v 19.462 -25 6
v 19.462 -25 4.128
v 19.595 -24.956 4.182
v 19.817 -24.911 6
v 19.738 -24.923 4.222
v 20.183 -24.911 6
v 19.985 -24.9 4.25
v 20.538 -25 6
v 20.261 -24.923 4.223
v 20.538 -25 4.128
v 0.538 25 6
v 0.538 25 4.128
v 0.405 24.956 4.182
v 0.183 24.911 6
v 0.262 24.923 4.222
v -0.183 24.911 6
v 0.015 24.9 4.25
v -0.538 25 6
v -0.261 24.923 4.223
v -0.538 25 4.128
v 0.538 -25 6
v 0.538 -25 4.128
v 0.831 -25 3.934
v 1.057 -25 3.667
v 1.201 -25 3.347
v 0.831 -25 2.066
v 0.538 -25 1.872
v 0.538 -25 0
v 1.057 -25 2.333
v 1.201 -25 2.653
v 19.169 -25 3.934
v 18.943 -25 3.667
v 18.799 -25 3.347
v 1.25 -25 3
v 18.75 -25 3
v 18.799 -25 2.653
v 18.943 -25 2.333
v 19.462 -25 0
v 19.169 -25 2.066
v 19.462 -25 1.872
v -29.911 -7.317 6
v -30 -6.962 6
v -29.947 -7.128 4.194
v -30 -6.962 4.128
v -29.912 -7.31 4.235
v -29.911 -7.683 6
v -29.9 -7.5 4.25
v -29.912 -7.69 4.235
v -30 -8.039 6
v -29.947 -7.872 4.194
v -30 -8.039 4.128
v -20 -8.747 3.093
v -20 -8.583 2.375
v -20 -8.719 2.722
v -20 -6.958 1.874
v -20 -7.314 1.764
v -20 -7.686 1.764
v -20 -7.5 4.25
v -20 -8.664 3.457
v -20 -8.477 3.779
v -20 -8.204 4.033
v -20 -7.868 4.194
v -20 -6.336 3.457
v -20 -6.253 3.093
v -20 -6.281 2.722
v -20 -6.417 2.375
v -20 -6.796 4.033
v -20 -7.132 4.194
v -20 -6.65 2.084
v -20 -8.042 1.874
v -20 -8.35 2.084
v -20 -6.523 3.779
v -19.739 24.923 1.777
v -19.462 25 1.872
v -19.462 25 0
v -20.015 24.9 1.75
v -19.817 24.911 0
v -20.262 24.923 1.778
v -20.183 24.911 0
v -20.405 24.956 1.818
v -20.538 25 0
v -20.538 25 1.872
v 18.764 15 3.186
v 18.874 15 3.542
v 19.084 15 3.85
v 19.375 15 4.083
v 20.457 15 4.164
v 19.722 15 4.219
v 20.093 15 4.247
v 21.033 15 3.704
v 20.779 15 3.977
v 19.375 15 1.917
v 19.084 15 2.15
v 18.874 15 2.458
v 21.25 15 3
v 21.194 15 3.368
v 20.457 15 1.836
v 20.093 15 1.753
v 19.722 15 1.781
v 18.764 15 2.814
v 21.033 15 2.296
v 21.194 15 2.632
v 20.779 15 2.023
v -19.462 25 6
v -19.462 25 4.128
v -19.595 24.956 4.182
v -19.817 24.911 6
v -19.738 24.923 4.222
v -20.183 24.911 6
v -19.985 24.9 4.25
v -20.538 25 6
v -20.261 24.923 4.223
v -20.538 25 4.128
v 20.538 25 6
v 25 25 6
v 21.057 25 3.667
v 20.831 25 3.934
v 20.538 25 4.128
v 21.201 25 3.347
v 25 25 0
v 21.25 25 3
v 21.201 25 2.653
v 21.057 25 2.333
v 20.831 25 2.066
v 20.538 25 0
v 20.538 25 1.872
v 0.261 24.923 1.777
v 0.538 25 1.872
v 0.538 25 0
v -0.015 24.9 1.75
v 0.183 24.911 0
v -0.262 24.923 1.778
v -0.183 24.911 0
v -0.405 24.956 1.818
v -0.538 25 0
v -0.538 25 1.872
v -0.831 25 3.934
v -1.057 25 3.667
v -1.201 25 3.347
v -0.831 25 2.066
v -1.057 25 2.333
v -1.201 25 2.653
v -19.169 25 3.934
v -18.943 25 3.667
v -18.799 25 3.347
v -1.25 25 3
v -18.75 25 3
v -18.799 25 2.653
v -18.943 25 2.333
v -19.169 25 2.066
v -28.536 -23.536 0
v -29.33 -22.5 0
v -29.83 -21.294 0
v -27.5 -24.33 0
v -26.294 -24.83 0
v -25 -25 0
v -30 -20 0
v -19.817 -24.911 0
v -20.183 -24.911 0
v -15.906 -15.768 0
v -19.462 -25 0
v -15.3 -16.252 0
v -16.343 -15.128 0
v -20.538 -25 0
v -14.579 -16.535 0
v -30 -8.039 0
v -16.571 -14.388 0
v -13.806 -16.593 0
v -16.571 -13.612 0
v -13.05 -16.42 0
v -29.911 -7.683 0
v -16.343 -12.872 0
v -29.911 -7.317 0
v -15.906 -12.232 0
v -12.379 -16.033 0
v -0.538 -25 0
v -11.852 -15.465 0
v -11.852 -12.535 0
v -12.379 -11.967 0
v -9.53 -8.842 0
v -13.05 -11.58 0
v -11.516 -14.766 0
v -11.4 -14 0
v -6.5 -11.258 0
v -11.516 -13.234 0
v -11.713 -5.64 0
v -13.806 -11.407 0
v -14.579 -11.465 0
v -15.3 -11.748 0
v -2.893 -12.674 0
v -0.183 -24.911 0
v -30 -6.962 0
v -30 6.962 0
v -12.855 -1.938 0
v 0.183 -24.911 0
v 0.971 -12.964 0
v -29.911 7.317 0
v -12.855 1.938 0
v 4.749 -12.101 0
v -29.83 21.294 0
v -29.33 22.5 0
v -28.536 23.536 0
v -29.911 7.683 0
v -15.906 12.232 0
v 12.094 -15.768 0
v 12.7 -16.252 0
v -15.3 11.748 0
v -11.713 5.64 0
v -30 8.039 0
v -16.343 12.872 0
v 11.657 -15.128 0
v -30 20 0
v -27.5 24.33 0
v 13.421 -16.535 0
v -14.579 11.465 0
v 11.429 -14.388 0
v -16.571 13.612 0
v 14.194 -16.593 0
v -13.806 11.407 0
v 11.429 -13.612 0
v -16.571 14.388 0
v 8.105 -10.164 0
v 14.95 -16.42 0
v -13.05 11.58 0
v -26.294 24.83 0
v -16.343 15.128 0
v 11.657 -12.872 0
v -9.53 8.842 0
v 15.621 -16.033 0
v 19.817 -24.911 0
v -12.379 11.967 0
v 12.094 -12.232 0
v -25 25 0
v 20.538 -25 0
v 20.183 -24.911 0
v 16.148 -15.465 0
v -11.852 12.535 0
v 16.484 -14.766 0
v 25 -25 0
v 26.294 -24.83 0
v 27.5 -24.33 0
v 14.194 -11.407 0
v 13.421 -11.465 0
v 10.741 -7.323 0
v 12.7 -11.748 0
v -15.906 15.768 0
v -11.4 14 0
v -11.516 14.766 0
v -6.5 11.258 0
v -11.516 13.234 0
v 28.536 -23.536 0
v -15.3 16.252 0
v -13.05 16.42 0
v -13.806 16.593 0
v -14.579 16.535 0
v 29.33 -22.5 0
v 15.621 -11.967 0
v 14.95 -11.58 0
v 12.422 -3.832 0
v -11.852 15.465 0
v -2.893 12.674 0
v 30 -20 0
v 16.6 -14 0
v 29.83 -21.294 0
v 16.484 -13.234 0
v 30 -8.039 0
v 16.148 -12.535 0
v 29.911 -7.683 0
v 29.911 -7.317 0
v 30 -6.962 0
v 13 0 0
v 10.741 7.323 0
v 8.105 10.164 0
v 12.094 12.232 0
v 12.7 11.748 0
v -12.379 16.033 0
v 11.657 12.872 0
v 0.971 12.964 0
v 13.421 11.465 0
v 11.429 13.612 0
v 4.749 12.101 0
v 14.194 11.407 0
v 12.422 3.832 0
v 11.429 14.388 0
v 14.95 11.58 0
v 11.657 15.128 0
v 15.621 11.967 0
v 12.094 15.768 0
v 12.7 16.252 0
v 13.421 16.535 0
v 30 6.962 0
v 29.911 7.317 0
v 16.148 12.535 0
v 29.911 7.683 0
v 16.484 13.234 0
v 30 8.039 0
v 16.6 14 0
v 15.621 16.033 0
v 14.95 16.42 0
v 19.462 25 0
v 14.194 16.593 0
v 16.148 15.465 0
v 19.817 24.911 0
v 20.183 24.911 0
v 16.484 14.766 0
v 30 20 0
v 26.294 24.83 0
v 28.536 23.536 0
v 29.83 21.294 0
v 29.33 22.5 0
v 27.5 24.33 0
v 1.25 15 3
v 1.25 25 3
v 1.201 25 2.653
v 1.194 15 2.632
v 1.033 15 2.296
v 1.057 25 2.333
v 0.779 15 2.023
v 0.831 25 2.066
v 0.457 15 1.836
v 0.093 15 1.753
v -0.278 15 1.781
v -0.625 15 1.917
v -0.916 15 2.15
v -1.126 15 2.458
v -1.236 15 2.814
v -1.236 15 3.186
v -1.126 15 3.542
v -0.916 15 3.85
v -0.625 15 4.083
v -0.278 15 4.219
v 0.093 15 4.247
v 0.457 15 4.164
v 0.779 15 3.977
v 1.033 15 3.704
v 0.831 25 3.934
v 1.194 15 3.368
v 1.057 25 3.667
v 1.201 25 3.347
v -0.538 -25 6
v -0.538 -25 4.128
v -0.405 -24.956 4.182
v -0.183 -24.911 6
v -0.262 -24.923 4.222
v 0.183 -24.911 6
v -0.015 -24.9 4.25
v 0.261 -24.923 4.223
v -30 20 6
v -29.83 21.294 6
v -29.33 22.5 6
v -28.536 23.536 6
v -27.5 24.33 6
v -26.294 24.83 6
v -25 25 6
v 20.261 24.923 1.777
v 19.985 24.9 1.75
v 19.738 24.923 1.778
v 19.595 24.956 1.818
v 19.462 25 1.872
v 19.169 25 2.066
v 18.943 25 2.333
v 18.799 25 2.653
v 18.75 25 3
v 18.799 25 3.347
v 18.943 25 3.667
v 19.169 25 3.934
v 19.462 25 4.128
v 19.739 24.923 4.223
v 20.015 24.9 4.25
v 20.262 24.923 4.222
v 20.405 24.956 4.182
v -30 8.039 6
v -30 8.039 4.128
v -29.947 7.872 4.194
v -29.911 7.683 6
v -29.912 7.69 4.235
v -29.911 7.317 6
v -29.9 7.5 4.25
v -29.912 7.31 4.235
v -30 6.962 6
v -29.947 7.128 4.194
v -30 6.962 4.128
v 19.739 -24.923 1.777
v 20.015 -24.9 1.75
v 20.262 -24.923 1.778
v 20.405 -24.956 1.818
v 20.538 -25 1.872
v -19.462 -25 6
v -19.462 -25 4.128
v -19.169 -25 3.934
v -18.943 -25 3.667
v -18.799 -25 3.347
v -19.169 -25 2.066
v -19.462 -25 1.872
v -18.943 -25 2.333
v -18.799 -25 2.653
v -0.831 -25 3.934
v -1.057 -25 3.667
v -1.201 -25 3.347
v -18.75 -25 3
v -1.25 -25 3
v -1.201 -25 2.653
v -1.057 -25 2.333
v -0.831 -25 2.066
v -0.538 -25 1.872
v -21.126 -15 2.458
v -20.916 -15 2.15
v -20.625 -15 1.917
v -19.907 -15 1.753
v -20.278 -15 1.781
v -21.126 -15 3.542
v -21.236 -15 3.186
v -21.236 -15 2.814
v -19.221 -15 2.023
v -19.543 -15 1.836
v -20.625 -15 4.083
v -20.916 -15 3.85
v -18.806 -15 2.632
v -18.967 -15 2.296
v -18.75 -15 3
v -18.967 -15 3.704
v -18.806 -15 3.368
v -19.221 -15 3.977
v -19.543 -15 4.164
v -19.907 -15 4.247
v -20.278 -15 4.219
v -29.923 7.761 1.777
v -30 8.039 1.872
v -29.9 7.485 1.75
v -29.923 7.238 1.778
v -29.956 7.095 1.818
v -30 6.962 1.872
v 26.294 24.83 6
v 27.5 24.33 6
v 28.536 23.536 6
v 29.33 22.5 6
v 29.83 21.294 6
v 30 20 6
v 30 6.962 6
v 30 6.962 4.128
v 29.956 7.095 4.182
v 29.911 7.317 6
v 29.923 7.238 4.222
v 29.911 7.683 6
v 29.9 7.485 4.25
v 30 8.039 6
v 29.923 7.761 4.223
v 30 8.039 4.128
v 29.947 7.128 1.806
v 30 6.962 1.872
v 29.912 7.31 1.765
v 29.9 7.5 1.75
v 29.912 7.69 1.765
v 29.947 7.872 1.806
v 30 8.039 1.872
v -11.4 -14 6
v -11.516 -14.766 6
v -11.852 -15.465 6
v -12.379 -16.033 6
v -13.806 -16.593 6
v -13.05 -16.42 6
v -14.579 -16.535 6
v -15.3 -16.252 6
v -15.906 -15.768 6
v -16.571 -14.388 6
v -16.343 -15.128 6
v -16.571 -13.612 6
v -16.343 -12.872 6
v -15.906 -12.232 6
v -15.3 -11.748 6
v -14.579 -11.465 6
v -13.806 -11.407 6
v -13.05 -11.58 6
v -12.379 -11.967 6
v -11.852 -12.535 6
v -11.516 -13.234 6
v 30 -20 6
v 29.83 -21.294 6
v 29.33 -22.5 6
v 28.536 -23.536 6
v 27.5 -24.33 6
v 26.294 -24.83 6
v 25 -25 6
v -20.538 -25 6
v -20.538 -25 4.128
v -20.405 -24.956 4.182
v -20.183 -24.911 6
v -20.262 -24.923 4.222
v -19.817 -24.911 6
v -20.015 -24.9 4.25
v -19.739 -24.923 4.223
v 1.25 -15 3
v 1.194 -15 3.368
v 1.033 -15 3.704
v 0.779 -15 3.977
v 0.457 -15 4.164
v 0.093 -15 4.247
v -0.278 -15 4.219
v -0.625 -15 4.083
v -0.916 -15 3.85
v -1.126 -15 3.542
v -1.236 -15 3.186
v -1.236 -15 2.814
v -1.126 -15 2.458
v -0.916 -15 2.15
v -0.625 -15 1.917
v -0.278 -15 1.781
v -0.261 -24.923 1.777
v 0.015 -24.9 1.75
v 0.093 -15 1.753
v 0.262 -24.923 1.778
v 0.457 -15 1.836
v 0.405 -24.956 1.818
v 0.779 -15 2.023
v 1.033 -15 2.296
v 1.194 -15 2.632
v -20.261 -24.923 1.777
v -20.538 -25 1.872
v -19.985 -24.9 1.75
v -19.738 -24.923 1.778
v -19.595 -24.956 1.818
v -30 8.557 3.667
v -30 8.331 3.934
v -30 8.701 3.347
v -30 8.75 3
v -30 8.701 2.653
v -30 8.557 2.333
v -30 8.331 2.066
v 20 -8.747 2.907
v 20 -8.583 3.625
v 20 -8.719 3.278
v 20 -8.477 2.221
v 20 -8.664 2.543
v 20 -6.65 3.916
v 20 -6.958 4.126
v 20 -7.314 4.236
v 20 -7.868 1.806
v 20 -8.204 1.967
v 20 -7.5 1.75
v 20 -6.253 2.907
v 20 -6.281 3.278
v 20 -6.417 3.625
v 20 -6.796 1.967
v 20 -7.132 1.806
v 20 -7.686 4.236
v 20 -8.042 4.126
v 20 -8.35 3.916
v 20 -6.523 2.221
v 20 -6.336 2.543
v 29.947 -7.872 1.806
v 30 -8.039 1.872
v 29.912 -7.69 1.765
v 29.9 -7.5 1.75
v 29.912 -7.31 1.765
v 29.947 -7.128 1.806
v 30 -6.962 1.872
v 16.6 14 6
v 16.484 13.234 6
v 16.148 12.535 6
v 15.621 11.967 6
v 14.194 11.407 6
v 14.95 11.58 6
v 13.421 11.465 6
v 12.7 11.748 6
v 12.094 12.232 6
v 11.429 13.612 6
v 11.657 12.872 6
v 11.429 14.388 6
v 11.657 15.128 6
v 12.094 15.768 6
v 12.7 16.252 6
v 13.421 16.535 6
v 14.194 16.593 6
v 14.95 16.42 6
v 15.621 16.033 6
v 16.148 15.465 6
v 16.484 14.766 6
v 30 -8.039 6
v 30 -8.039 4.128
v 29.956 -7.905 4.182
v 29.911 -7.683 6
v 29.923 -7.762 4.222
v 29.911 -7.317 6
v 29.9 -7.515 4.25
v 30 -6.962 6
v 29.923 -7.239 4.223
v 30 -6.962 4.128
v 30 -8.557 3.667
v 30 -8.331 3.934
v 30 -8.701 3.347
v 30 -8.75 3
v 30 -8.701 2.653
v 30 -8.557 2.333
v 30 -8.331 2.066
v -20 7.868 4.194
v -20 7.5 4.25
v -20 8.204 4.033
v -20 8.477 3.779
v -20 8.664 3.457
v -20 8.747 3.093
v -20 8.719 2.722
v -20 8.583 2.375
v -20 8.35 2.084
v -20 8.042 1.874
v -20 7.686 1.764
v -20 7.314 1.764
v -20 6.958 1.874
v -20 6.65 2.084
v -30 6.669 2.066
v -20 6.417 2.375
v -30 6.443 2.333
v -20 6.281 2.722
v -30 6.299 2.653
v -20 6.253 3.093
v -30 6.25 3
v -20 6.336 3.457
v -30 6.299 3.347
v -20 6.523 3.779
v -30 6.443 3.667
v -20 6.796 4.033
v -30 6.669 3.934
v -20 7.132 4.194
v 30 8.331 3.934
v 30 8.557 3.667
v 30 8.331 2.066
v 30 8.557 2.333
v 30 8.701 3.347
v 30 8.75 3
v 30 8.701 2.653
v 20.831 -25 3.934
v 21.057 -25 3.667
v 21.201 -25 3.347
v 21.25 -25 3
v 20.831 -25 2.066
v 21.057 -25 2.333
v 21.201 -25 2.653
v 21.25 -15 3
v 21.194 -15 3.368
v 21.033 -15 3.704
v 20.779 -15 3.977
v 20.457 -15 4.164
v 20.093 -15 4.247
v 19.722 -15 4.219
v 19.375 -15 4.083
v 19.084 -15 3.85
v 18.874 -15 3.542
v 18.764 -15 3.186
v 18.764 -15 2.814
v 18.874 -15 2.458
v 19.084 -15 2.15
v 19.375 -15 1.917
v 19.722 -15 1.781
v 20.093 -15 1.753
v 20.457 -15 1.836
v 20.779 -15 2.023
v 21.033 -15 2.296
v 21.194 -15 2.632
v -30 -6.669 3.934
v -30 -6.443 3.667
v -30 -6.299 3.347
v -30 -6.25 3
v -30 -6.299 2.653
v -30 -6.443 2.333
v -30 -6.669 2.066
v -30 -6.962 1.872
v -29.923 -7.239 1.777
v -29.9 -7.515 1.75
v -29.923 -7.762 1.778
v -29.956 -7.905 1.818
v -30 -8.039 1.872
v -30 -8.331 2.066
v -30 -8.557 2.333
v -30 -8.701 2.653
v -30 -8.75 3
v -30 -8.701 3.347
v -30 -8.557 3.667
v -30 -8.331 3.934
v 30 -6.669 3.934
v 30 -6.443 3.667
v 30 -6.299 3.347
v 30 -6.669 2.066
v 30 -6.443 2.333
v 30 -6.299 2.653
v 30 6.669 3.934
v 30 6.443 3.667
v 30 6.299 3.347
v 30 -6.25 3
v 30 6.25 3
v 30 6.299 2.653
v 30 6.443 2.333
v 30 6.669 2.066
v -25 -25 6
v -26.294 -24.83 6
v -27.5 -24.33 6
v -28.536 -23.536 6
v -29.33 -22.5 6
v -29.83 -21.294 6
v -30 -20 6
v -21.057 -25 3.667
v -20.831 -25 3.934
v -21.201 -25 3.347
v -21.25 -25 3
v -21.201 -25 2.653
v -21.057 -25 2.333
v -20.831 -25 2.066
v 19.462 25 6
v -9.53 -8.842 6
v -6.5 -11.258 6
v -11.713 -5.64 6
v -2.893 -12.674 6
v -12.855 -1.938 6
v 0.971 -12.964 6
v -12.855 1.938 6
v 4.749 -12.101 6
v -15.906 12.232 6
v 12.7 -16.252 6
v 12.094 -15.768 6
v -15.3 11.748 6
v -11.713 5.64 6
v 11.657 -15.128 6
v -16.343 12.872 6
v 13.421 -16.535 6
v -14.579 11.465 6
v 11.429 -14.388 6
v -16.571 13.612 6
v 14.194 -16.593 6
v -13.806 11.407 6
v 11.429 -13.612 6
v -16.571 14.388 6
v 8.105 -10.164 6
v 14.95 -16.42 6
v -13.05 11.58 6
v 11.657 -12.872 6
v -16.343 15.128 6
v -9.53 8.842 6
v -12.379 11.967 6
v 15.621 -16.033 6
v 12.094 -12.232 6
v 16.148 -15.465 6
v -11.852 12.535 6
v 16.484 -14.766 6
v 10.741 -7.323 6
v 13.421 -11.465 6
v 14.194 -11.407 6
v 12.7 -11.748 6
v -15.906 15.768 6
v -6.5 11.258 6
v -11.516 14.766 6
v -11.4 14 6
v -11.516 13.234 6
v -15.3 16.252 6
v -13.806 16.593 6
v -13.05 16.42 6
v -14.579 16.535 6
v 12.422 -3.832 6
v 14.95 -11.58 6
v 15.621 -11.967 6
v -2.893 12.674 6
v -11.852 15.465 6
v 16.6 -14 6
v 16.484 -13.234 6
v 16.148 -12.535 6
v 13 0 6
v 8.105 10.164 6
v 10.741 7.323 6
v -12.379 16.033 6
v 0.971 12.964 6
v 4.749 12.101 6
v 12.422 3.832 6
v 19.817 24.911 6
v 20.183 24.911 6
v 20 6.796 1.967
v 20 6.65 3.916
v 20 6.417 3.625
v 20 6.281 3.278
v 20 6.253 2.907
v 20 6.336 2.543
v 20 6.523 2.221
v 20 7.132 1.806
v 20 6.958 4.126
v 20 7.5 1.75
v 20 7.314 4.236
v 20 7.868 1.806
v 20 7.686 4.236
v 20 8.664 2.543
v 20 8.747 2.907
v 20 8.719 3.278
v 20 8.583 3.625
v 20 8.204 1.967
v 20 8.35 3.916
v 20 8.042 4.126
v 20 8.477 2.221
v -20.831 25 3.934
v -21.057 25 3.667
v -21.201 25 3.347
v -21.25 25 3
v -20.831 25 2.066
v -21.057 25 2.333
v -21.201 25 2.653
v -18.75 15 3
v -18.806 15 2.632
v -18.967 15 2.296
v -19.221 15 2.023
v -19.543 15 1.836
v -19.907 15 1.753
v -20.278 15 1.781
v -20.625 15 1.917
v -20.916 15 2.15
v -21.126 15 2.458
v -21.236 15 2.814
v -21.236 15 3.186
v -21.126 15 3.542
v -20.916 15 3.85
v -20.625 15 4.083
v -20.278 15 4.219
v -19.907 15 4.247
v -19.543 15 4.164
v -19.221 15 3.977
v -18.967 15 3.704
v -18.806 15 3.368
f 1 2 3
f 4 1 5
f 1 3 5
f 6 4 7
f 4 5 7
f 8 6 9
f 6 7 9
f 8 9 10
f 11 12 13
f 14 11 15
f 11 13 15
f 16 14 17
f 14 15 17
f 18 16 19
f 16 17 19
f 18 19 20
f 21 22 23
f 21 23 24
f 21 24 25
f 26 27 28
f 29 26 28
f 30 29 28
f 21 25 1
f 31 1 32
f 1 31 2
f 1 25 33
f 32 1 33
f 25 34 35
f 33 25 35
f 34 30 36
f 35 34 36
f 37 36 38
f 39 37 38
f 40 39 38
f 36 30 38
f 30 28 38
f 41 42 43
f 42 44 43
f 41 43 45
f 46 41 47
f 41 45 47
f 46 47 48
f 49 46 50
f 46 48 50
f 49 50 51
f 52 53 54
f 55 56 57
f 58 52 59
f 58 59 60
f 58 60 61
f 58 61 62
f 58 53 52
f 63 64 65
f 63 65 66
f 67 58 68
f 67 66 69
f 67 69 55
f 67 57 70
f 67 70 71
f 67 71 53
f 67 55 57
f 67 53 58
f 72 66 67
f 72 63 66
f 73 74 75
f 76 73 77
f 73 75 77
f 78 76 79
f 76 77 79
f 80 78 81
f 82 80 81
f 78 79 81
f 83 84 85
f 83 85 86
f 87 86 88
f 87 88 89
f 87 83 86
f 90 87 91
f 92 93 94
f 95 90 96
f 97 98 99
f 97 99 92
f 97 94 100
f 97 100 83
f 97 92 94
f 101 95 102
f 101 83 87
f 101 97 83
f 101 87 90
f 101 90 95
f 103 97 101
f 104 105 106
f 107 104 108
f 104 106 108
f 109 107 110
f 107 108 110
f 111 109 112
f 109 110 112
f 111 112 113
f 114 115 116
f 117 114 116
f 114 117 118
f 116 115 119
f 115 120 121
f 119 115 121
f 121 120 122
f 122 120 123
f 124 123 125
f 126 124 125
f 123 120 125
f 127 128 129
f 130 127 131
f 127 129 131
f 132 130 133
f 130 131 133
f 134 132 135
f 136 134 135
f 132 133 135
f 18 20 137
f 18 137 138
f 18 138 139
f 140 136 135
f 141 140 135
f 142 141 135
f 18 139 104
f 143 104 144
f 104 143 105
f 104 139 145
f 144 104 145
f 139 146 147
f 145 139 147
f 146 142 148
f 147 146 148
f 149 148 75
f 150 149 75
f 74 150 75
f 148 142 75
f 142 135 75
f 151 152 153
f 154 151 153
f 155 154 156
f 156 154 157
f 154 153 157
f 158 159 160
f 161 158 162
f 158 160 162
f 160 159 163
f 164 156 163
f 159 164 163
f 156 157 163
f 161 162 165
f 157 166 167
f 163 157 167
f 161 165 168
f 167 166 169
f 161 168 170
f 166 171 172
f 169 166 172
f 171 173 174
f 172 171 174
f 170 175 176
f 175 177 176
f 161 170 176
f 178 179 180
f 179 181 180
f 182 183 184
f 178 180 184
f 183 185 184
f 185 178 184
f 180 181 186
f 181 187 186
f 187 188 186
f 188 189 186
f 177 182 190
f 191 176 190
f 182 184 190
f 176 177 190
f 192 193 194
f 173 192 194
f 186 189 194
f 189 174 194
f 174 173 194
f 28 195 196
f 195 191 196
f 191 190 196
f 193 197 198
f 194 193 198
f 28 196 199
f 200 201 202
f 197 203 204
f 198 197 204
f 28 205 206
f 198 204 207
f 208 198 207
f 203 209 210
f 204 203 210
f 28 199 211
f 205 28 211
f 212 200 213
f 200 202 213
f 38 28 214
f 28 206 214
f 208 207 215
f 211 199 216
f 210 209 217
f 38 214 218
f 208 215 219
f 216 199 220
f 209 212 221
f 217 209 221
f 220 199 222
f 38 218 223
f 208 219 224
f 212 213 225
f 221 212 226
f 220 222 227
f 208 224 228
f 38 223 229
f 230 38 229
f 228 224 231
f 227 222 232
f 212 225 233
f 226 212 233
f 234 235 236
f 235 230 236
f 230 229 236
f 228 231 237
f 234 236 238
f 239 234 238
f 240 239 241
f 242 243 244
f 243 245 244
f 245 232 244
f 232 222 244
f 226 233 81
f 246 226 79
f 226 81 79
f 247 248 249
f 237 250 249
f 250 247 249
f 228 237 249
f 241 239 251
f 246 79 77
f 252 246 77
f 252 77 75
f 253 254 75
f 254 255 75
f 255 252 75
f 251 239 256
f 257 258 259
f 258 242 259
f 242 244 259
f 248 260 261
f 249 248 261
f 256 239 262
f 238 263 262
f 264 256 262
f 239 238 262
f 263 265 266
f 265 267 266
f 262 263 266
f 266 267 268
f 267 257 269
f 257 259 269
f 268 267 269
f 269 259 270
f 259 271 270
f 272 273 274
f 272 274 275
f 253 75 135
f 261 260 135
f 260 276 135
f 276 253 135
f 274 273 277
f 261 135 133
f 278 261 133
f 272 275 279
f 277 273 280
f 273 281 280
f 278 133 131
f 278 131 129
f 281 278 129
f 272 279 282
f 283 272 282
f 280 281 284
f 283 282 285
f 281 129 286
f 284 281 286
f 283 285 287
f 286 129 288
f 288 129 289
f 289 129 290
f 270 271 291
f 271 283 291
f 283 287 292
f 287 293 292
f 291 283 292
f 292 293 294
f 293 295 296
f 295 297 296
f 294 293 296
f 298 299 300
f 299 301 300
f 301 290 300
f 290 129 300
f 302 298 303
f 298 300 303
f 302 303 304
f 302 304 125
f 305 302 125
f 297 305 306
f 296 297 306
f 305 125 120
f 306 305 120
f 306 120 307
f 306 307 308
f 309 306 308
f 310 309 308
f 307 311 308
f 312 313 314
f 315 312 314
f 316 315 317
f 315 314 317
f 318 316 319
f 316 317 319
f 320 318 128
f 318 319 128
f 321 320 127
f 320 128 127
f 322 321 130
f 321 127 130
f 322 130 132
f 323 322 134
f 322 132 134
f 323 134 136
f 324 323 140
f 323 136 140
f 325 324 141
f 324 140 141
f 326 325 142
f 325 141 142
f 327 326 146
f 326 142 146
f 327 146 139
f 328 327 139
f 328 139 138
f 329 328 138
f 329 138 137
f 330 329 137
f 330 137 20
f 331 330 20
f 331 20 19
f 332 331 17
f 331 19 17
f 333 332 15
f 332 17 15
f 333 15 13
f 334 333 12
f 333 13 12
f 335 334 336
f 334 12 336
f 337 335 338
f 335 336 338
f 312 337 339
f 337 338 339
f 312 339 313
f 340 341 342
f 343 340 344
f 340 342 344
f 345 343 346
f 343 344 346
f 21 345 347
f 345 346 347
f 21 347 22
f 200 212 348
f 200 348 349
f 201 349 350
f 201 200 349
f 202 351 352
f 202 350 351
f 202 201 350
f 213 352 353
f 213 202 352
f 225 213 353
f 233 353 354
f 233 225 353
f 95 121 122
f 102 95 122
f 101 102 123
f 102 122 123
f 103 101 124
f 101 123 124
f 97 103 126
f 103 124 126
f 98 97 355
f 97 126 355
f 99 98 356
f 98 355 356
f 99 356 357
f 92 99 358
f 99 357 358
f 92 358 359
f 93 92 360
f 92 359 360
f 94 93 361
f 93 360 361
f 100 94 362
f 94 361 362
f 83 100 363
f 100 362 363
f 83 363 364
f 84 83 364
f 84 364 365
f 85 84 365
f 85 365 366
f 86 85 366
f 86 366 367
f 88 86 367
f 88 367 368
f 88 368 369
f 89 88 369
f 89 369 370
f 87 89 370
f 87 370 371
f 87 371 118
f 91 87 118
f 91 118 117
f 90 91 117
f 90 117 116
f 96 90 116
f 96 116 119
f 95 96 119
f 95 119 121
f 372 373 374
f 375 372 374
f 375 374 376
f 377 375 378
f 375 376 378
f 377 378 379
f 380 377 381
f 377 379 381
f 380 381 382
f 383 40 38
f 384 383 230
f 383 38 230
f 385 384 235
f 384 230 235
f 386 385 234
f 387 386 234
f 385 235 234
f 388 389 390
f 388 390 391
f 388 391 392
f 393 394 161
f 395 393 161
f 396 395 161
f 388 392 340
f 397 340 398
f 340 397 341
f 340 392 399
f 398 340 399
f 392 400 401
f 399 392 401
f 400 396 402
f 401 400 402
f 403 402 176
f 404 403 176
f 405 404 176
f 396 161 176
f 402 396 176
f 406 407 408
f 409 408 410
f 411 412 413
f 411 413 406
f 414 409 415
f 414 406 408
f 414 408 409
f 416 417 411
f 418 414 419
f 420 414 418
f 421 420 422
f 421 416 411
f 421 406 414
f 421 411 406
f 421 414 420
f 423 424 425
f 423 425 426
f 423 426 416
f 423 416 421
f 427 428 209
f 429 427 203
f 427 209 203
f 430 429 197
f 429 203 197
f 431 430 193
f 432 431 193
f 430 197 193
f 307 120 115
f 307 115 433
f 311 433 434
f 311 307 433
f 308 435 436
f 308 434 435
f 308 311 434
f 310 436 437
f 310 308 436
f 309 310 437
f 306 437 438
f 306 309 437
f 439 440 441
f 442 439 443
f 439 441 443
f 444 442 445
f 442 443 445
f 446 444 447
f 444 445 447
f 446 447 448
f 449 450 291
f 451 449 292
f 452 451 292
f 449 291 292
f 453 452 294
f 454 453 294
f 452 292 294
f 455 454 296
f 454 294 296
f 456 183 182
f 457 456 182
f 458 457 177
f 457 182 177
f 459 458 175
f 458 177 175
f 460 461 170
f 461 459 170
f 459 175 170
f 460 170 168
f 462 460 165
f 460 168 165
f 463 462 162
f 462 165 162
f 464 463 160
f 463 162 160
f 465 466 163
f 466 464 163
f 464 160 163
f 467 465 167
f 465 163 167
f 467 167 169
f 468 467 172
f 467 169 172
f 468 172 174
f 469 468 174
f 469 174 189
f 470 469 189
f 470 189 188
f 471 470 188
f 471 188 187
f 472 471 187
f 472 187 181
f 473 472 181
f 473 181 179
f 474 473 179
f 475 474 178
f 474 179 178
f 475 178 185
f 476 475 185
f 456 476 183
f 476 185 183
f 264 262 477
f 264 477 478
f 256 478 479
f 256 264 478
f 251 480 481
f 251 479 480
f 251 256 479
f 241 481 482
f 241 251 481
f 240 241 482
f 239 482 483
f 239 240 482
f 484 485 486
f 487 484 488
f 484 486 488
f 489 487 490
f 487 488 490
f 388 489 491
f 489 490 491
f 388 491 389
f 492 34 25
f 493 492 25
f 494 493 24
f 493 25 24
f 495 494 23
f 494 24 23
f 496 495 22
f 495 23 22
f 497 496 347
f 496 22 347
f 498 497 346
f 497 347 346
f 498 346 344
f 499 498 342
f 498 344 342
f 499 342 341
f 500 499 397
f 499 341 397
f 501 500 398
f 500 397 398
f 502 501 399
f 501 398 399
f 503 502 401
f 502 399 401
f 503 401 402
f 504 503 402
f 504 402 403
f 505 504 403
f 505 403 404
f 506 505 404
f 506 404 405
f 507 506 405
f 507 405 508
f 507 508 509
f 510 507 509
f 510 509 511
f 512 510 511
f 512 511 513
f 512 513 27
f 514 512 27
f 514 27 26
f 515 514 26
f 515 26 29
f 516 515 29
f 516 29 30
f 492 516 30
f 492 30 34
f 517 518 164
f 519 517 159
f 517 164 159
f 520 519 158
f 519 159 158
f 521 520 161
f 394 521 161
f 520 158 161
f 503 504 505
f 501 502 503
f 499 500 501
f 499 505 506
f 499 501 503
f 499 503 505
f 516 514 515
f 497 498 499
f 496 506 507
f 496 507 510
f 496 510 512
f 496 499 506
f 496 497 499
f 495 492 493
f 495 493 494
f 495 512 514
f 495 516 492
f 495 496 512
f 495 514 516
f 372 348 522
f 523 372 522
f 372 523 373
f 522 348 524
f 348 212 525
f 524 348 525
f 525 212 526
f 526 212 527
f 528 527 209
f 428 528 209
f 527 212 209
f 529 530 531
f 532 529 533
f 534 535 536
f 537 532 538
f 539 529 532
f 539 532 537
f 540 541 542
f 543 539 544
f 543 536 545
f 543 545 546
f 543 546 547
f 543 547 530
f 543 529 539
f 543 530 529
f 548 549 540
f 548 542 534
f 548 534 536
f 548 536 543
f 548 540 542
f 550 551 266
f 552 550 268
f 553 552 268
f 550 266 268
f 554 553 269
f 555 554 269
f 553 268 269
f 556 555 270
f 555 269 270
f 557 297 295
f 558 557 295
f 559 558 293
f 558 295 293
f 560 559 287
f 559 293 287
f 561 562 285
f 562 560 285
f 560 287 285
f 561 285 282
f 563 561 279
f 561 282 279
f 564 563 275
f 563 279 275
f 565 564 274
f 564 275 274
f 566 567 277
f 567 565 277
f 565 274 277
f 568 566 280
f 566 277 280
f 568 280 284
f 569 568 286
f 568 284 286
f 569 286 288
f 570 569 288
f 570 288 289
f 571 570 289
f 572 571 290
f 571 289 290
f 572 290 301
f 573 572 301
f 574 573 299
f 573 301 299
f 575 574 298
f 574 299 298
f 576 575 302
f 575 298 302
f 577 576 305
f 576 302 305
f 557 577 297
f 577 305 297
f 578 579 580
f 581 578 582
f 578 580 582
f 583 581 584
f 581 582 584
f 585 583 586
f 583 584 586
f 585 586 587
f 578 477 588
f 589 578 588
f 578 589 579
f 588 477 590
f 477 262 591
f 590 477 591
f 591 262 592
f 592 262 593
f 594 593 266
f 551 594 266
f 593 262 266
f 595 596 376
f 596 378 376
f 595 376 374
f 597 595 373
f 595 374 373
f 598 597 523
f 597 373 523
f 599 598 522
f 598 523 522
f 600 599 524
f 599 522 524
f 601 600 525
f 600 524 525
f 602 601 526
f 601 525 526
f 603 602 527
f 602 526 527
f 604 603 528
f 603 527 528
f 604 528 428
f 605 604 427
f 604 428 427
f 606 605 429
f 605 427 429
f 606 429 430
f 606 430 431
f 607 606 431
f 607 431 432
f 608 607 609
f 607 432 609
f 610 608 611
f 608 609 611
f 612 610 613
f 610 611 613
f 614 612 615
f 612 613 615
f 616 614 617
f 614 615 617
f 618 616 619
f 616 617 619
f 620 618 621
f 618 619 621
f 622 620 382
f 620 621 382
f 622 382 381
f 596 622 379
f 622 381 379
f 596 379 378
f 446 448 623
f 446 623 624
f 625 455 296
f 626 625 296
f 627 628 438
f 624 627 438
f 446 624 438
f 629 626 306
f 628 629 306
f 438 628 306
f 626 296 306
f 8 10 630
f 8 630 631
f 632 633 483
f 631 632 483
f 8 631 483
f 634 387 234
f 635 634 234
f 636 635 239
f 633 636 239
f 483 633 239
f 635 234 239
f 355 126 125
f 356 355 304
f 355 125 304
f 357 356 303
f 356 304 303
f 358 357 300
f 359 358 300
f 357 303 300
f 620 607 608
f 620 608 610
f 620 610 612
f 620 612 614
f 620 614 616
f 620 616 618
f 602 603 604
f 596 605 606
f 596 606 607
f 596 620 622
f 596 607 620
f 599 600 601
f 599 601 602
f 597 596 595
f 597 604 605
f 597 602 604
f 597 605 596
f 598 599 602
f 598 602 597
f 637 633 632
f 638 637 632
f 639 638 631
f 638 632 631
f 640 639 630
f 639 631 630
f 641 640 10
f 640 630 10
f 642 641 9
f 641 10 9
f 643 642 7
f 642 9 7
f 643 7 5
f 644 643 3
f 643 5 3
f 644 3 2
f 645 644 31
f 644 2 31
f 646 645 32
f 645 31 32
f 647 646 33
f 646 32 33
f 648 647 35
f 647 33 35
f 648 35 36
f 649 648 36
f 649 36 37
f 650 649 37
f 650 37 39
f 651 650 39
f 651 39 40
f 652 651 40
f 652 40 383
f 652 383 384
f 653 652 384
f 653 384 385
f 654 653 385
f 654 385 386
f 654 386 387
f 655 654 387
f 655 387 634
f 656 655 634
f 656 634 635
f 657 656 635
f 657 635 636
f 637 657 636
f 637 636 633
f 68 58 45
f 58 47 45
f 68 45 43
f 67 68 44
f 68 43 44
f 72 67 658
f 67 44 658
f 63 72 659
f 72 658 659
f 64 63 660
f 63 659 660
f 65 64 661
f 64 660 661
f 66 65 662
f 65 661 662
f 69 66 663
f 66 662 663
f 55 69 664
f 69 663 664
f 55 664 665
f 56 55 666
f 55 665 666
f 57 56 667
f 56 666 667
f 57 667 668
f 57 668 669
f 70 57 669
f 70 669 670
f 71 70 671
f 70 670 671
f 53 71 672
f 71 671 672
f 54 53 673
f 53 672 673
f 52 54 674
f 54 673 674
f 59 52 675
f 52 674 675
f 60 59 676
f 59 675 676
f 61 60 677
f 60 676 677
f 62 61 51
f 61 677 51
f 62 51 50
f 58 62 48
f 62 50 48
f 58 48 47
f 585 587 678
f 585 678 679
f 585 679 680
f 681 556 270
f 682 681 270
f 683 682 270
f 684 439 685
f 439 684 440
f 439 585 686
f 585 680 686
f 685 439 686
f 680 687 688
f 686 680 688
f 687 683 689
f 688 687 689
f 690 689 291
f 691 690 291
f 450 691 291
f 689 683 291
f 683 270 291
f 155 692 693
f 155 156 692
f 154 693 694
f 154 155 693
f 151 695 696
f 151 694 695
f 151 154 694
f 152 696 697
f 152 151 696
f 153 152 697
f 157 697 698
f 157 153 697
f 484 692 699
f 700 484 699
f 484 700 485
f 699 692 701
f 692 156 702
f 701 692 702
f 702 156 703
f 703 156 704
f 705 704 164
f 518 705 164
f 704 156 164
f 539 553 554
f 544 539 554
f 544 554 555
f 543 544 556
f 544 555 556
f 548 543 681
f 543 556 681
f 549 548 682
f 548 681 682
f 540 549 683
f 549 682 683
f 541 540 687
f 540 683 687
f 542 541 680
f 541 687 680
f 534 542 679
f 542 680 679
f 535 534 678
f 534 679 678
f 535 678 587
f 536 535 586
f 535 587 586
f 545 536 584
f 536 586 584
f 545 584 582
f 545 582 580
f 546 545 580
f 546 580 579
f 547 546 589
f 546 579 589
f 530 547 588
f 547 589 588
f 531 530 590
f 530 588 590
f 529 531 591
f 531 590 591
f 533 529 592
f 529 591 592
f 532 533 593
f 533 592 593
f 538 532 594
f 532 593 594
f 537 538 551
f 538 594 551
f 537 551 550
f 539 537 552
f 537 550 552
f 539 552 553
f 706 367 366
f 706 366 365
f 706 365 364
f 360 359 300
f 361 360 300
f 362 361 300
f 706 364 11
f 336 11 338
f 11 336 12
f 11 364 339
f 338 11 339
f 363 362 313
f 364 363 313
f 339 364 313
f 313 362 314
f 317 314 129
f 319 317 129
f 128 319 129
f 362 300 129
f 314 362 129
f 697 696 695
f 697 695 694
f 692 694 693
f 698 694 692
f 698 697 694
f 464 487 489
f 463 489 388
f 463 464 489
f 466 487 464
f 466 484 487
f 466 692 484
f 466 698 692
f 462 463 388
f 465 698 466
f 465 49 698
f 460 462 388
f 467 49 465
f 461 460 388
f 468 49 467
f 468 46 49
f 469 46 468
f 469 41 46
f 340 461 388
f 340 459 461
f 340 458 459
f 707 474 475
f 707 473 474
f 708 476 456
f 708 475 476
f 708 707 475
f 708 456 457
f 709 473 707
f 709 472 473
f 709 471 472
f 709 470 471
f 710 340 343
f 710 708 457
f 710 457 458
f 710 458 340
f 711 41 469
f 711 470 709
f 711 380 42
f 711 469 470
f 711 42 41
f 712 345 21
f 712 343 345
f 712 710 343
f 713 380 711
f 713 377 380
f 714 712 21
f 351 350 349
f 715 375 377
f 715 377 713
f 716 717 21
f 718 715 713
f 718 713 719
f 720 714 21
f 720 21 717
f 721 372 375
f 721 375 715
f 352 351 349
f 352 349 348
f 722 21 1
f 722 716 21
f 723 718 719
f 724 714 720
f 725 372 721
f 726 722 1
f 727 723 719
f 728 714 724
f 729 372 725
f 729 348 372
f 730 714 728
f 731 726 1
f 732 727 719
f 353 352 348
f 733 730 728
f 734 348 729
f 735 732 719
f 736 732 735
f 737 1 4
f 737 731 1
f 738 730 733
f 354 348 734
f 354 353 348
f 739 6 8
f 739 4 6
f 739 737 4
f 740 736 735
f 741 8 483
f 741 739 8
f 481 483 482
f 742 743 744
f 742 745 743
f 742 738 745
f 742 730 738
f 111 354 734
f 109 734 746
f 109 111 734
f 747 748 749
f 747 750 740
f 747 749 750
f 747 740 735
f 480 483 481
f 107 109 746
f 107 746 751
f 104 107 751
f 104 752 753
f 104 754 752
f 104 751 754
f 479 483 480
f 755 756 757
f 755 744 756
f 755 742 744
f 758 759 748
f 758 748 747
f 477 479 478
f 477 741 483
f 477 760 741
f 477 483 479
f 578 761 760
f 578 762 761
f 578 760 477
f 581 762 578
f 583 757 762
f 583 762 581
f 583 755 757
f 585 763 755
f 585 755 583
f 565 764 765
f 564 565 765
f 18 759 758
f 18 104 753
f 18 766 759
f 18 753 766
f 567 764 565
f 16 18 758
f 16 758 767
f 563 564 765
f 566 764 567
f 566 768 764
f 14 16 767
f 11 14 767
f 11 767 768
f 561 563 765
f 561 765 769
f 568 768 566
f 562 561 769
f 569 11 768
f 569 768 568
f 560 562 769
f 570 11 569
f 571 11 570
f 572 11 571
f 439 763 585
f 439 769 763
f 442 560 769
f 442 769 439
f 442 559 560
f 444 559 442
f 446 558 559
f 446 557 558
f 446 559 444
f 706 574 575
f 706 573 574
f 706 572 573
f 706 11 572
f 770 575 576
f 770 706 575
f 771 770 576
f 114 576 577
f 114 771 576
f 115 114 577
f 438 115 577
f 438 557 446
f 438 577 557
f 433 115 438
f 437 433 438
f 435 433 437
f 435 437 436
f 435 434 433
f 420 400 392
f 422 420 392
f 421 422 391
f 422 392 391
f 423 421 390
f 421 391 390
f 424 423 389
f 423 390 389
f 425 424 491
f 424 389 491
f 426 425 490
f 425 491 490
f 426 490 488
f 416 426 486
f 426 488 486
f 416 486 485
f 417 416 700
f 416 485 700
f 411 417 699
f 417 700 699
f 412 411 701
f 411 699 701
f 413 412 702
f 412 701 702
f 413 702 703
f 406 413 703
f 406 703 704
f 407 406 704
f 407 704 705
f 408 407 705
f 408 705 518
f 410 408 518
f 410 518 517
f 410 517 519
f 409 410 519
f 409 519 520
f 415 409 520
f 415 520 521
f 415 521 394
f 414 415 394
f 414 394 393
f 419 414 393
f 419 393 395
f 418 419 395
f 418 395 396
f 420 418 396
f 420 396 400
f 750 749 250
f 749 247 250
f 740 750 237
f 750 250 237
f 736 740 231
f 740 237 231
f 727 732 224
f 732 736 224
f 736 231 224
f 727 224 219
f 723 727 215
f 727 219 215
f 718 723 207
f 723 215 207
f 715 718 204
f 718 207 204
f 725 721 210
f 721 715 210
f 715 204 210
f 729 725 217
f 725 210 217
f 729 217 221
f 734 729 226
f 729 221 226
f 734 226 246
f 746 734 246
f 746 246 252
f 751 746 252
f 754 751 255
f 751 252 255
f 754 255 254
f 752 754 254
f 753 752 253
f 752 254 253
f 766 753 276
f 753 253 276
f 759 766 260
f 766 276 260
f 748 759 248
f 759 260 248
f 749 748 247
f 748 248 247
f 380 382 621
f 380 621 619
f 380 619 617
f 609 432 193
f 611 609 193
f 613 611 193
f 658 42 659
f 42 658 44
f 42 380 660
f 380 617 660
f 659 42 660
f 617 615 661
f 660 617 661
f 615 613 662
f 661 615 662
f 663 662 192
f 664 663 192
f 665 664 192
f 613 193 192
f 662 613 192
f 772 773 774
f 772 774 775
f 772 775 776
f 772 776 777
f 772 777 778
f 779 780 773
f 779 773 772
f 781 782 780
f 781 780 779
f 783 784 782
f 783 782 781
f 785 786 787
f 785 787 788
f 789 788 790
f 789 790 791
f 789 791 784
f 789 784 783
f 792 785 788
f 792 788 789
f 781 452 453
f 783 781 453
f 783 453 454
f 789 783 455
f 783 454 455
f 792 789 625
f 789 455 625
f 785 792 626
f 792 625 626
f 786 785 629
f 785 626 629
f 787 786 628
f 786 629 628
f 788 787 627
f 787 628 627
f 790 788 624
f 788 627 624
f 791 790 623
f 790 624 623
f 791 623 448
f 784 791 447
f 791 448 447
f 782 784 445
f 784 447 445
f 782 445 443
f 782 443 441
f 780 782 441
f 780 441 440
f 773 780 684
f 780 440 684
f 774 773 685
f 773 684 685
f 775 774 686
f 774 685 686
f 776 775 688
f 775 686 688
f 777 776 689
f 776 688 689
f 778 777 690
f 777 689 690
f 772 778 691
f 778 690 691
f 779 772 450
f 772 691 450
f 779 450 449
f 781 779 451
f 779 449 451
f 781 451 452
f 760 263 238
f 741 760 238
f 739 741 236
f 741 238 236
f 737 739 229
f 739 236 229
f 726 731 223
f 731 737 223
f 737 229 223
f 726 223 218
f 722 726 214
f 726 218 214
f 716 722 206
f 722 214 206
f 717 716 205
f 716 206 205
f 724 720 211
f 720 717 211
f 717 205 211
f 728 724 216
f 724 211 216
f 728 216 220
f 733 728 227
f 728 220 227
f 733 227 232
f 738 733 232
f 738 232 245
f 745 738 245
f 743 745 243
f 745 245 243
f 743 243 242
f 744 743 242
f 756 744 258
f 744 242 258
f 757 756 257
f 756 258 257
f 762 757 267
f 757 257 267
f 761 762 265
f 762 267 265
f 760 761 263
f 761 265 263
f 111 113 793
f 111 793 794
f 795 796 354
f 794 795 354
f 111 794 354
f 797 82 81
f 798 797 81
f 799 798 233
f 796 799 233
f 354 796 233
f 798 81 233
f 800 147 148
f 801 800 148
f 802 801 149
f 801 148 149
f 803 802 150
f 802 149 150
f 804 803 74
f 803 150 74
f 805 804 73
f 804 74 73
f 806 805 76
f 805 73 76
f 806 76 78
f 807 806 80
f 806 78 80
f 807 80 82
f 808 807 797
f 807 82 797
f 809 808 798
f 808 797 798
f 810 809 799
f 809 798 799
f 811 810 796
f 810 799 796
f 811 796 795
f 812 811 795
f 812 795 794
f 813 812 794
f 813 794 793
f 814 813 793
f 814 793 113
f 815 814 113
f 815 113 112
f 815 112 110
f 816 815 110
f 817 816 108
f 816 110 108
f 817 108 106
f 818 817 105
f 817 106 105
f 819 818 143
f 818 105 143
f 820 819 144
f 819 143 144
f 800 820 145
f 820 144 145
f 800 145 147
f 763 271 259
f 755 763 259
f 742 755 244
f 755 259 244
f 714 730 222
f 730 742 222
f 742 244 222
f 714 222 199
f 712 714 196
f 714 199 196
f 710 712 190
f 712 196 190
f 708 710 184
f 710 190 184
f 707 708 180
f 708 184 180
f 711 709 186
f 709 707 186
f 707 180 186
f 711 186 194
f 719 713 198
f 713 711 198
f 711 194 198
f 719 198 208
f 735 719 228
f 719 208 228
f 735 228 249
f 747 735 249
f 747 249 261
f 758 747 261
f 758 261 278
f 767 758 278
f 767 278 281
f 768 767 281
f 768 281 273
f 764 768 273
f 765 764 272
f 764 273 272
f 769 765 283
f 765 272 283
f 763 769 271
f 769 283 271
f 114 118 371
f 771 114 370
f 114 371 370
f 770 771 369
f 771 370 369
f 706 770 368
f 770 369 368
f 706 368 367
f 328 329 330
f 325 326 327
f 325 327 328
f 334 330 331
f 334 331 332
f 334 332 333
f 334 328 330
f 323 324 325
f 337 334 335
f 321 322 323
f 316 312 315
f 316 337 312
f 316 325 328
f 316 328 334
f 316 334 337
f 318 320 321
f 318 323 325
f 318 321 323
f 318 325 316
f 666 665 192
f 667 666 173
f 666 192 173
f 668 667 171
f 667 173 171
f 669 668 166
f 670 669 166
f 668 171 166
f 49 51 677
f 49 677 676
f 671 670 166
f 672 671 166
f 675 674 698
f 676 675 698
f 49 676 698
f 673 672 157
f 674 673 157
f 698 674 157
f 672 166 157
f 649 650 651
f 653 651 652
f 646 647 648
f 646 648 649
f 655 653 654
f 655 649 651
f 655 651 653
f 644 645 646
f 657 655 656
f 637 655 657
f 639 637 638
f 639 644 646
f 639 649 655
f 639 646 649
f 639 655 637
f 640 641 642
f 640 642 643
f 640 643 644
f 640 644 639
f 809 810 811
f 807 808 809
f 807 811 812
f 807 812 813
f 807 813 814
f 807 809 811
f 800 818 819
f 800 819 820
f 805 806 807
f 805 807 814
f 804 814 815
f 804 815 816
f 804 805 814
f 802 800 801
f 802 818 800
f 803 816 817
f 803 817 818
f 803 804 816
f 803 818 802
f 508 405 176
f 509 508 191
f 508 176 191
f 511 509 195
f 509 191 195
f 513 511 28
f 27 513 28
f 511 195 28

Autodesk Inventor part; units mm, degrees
ref_plane "YZ Plane" through (0, 0, 0) normal (1, 0, 0) x (0, 1, 0)
ref_plane "XZ Plane" through (0, 0, 0) normal (0, 1, 0) x (-1, 0, 0)
ref_plane "XY Plane" through (0, 0, 0) normal (0, 0, 1) x (1, 0, 0)
sketch "スケッチ1" plane through (0, 0, 0) normal (0, 0, 1) x (1, 0, 0)
  circle A0 centre (0, 0) radius 13
  circle A1 centre (-14, 14) radius 2.6
  circle A2 centre (14, 14) radius 2.6
  circle A3 centre (14, -14) radius 2.6
  circle A4 centre (-14, -14) radius 2.6
  line L0 (25, 25) -> (20.5385, 25)
  line L1 (-30, 20) -> (-30, 8.0385)
  line L2 (-25, -25) -> (-20.5385, -25)
  line L3 (30, -20) -> (30, -8.0385)
  line L4 (30, 25) -> (-30, -25) construction
  line L5 (-30, 25) -> (30, -25) construction
  arc A5 (-19.4615, 25) -> (-20.5385, 25) centre (-20, 26.4) ccw construction
  arc A6 (0.5385, 25) -> (-0.5385, 25) centre (0, 26.4) ccw construction
  arc A7 (20.5385, 25) -> (19.4615, 25) centre (20, 26.4) ccw construction
  arc A8 (-20.5385, 25) -> (-19.4615, 25) centre (-20, 26.4) ccw
  line L6 (-19.4615, 25) -> (-20.5385, 25) construction
  line L7 (-20.5385, 25) -> (-25, 25)
  arc A9 (-0.5385, 25) -> (0.5385, 25) centre (0, 26.4) ccw
  line L8 (0.5385, 25) -> (-0.5385, 25) construction
  line L9 (-0.5385, 25) -> (-19.4615, 25)
  arc A10 (19.4615, 25) -> (20.5385, 25) centre (20, 26.4) ccw
  line L10 (20.5385, 25) -> (19.4615, 25) construction
  line L11 (19.4615, 25) -> (0.5385, 25)
  arc A11 (-0.5385, -25) -> (0.5385, -25) centre (0, -26.4) ccw construction
  arc A12 (-20.5385, -25) -> (-19.4615, -25) centre (-20, -26.4) ccw construction
  arc A13 (19.4615, -25) -> (20.5385, -25) centre (20, -26.4) ccw construction
  arc A14 (-19.4615, -25) -> (-20.5385, -25) centre (-20, -26.4) ccw
  line L12 (-19.4615, -25) -> (-0.5385, -25)
  line L13 (-20.5385, -25) -> (-19.4615, -25) construction
  arc A15 (0.5385, -25) -> (-0.5385, -25) centre (0, -26.4) ccw
  line L14 (0.5385, -25) -> (19.4615, -25)
  line L15 (-0.5385, -25) -> (0.5385, -25) construction
  arc A16 (20.5385, -25) -> (19.4615, -25) centre (20, -26.4) ccw
  line L16 (20.5385, -25) -> (25, -25)
  line L17 (19.4615, -25) -> (20.5385, -25) construction
  arc A17 (-30, 8.0385) -> (-30, 6.9615) centre (-31.4, 7.5) ccw construction
  arc A18 (-30, -6.9615) -> (-30, -8.0385) centre (-31.4, -7.5) ccw construction
  arc A19 (30, 6.9615) -> (30, 8.0385) centre (31.4, 7.5) ccw construction
  arc A20 (30, -8.0385) -> (30, -6.9615) centre (31.4, -7.5) ccw construction
  arc A21 (-30, 6.9615) -> (-30, 8.0385) centre (-31.4, 7.5) ccw
  line L18 (-30, 6.9615) -> (-30, -6.9615)
  line L19 (-30, 8.0385) -> (-30, 6.9615) construction
  arc A22 (-30, -8.0385) -> (-30, -6.9615) centre (-31.4, -7.5) ccw
  line L20 (-30, -8.0385) -> (-30, -20)
  line L21 (-30, -6.9615) -> (-30, -8.0385) construction
  arc A23 (30, 8.0385) -> (30, 6.9615) centre (31.4, 7.5) ccw
  line L22 (30, 6.9615) -> (30, 8.0385) construction
  line L23 (30, 8.0385) -> (30, 20)
  arc A24 (30, -6.9615) -> (30, -8.0385) centre (31.4, -7.5) ccw
  line L24 (30, -6.9615) -> (30, 6.9615)
  line L25 (30, -8.0385) -> (30, -6.9615) construction
  arc A25 (-25, 25) -> (-30, 20) centre (-25, 20) ccw
  arc A26 (30, 20) -> (25, 25) centre (25, 20) ccw
  arc A27 (25, -25) -> (30, -20) centre (25, -20) ccw
  arc A28 (-30, -20) -> (-25, -25) centre (-25, -20) ccw
  point P0 (0, 0)
  point P1 (0, 0)
  dimension "d0" = 26
  dimension "d1" = 28
  dimension "d2" = 14
  dimension "d3" = 5.2
  dimension "d4" = 5.2
  dimension "d5" = 28
  dimension "d6" = 14
  dimension "d7" = 5.2
  dimension "d8" = 5.2
  dimension "d9" = 60
  dimension "d10" = 50
  dimension "d11" = 3
  dimension "d12" = 3
  dimension "d13" = 20
  dimension "d14" = 3
  dimension "d15" = 20
  dimension "d16" = 1.4
  dimension "d17" = 3
  dimension "d18" = 3
  dimension "d19" = 3
  dimension "d20" = 20
  dimension "d21" = 20
  dimension "d22" = 1.4
  dimension "d23" = 3
  dimension "d24" = 3
  dimension "d25" = 3
  dimension "d26" = 3
  dimension "d27" = 15
  dimension "d28" = 15
  dimension "d29" = 7.5
  dimension "d30" = 7.5
  dimension "d31" = 1.4
  dimension "d32" = 1.4
  dimension "d33" = 5
extrude "押し出し1" add sketch "スケッチ1" along normal blind 6
sketch "スケッチ2" plane through (-19.4615, 25, 0) normal (0, 1, 0) x (1, 0, 0)
  circle A0 centre (-0.5385, -3) radius 1.25
  circle A1 centre (19.4615, -3) radius 1.25
  circle A2 centre (39.4615, -3) radius 1.25
  point P0 (19.4615, 0)
  dimension "d36" = 2.5
  dimension "d37" = 2.5
  dimension "d38" = 2.5
  dimension "d39" = 3
  dimension "d40" = 20
  dimension "d41" = 20
sketch "スケッチ3" plane through (30, -6.9615, 0) normal (1, 0, 0) x (0, 0, -1)
  circle A0 centre (-3, 14.4615) radius 1.25
  circle A1 centre (-3, -0.5385) radius 1.25
  point P0 (0, 6.9615)
  dimension "d42" = 2.5
  dimension "d43" = 2.5
  dimension "d44" = 3
  dimension "d45" = 7.5
  dimension "d46" = 7.5
extrude "押し出し2" cut sketch "スケッチ3" against normal blind 10
extrude "押し出し3" cut sketch "スケッチ2" against normal blind 10
sketch "スケッチ4" plane through (0.5385, -25, 0) normal (0, -1, 0) x (1, 0, 0)
  circle A0 centre (-0.5385, 3) radius 1.25
  circle A1 centre (-20.5385, 3) radius 1.25
  circle A2 centre (19.4615, 3) radius 1.25
  point P0 (-0.5385, 0)
  dimension "d51" = 2.5
  dimension "d52" = 2.5
  dimension "d53" = 2.5
  dimension "d54" = 20
  dimension "d55" = 20
  dimension "d56" = 3
extrude "押し出し4" cut sketch "スケッチ4" against normal blind 10
sketch "スケッチ5" plane through (-30, -6.9615, 0) normal (-1, 0, 0) x (0, 0, 1)
  circle A0 centre (3, 14.4615) radius 1.25 projected
  circle A1 centre (3, -0.5385) radius 1.25 projected
  point P0 (0, 6.9615)
extrude "押し出し5" cut sketch "スケッチ5" against normal blind 10
equation "\"d2\" = 0.5 * d1"
equation "\"d6\" = 0.5 * d5"
equation "\"d29\" = 0.5 * d27"
equation "\"d30\" = 0.5 * d28"
properties part number "エアシリンダマウント" material "ポリカーボネート、スモーク"
